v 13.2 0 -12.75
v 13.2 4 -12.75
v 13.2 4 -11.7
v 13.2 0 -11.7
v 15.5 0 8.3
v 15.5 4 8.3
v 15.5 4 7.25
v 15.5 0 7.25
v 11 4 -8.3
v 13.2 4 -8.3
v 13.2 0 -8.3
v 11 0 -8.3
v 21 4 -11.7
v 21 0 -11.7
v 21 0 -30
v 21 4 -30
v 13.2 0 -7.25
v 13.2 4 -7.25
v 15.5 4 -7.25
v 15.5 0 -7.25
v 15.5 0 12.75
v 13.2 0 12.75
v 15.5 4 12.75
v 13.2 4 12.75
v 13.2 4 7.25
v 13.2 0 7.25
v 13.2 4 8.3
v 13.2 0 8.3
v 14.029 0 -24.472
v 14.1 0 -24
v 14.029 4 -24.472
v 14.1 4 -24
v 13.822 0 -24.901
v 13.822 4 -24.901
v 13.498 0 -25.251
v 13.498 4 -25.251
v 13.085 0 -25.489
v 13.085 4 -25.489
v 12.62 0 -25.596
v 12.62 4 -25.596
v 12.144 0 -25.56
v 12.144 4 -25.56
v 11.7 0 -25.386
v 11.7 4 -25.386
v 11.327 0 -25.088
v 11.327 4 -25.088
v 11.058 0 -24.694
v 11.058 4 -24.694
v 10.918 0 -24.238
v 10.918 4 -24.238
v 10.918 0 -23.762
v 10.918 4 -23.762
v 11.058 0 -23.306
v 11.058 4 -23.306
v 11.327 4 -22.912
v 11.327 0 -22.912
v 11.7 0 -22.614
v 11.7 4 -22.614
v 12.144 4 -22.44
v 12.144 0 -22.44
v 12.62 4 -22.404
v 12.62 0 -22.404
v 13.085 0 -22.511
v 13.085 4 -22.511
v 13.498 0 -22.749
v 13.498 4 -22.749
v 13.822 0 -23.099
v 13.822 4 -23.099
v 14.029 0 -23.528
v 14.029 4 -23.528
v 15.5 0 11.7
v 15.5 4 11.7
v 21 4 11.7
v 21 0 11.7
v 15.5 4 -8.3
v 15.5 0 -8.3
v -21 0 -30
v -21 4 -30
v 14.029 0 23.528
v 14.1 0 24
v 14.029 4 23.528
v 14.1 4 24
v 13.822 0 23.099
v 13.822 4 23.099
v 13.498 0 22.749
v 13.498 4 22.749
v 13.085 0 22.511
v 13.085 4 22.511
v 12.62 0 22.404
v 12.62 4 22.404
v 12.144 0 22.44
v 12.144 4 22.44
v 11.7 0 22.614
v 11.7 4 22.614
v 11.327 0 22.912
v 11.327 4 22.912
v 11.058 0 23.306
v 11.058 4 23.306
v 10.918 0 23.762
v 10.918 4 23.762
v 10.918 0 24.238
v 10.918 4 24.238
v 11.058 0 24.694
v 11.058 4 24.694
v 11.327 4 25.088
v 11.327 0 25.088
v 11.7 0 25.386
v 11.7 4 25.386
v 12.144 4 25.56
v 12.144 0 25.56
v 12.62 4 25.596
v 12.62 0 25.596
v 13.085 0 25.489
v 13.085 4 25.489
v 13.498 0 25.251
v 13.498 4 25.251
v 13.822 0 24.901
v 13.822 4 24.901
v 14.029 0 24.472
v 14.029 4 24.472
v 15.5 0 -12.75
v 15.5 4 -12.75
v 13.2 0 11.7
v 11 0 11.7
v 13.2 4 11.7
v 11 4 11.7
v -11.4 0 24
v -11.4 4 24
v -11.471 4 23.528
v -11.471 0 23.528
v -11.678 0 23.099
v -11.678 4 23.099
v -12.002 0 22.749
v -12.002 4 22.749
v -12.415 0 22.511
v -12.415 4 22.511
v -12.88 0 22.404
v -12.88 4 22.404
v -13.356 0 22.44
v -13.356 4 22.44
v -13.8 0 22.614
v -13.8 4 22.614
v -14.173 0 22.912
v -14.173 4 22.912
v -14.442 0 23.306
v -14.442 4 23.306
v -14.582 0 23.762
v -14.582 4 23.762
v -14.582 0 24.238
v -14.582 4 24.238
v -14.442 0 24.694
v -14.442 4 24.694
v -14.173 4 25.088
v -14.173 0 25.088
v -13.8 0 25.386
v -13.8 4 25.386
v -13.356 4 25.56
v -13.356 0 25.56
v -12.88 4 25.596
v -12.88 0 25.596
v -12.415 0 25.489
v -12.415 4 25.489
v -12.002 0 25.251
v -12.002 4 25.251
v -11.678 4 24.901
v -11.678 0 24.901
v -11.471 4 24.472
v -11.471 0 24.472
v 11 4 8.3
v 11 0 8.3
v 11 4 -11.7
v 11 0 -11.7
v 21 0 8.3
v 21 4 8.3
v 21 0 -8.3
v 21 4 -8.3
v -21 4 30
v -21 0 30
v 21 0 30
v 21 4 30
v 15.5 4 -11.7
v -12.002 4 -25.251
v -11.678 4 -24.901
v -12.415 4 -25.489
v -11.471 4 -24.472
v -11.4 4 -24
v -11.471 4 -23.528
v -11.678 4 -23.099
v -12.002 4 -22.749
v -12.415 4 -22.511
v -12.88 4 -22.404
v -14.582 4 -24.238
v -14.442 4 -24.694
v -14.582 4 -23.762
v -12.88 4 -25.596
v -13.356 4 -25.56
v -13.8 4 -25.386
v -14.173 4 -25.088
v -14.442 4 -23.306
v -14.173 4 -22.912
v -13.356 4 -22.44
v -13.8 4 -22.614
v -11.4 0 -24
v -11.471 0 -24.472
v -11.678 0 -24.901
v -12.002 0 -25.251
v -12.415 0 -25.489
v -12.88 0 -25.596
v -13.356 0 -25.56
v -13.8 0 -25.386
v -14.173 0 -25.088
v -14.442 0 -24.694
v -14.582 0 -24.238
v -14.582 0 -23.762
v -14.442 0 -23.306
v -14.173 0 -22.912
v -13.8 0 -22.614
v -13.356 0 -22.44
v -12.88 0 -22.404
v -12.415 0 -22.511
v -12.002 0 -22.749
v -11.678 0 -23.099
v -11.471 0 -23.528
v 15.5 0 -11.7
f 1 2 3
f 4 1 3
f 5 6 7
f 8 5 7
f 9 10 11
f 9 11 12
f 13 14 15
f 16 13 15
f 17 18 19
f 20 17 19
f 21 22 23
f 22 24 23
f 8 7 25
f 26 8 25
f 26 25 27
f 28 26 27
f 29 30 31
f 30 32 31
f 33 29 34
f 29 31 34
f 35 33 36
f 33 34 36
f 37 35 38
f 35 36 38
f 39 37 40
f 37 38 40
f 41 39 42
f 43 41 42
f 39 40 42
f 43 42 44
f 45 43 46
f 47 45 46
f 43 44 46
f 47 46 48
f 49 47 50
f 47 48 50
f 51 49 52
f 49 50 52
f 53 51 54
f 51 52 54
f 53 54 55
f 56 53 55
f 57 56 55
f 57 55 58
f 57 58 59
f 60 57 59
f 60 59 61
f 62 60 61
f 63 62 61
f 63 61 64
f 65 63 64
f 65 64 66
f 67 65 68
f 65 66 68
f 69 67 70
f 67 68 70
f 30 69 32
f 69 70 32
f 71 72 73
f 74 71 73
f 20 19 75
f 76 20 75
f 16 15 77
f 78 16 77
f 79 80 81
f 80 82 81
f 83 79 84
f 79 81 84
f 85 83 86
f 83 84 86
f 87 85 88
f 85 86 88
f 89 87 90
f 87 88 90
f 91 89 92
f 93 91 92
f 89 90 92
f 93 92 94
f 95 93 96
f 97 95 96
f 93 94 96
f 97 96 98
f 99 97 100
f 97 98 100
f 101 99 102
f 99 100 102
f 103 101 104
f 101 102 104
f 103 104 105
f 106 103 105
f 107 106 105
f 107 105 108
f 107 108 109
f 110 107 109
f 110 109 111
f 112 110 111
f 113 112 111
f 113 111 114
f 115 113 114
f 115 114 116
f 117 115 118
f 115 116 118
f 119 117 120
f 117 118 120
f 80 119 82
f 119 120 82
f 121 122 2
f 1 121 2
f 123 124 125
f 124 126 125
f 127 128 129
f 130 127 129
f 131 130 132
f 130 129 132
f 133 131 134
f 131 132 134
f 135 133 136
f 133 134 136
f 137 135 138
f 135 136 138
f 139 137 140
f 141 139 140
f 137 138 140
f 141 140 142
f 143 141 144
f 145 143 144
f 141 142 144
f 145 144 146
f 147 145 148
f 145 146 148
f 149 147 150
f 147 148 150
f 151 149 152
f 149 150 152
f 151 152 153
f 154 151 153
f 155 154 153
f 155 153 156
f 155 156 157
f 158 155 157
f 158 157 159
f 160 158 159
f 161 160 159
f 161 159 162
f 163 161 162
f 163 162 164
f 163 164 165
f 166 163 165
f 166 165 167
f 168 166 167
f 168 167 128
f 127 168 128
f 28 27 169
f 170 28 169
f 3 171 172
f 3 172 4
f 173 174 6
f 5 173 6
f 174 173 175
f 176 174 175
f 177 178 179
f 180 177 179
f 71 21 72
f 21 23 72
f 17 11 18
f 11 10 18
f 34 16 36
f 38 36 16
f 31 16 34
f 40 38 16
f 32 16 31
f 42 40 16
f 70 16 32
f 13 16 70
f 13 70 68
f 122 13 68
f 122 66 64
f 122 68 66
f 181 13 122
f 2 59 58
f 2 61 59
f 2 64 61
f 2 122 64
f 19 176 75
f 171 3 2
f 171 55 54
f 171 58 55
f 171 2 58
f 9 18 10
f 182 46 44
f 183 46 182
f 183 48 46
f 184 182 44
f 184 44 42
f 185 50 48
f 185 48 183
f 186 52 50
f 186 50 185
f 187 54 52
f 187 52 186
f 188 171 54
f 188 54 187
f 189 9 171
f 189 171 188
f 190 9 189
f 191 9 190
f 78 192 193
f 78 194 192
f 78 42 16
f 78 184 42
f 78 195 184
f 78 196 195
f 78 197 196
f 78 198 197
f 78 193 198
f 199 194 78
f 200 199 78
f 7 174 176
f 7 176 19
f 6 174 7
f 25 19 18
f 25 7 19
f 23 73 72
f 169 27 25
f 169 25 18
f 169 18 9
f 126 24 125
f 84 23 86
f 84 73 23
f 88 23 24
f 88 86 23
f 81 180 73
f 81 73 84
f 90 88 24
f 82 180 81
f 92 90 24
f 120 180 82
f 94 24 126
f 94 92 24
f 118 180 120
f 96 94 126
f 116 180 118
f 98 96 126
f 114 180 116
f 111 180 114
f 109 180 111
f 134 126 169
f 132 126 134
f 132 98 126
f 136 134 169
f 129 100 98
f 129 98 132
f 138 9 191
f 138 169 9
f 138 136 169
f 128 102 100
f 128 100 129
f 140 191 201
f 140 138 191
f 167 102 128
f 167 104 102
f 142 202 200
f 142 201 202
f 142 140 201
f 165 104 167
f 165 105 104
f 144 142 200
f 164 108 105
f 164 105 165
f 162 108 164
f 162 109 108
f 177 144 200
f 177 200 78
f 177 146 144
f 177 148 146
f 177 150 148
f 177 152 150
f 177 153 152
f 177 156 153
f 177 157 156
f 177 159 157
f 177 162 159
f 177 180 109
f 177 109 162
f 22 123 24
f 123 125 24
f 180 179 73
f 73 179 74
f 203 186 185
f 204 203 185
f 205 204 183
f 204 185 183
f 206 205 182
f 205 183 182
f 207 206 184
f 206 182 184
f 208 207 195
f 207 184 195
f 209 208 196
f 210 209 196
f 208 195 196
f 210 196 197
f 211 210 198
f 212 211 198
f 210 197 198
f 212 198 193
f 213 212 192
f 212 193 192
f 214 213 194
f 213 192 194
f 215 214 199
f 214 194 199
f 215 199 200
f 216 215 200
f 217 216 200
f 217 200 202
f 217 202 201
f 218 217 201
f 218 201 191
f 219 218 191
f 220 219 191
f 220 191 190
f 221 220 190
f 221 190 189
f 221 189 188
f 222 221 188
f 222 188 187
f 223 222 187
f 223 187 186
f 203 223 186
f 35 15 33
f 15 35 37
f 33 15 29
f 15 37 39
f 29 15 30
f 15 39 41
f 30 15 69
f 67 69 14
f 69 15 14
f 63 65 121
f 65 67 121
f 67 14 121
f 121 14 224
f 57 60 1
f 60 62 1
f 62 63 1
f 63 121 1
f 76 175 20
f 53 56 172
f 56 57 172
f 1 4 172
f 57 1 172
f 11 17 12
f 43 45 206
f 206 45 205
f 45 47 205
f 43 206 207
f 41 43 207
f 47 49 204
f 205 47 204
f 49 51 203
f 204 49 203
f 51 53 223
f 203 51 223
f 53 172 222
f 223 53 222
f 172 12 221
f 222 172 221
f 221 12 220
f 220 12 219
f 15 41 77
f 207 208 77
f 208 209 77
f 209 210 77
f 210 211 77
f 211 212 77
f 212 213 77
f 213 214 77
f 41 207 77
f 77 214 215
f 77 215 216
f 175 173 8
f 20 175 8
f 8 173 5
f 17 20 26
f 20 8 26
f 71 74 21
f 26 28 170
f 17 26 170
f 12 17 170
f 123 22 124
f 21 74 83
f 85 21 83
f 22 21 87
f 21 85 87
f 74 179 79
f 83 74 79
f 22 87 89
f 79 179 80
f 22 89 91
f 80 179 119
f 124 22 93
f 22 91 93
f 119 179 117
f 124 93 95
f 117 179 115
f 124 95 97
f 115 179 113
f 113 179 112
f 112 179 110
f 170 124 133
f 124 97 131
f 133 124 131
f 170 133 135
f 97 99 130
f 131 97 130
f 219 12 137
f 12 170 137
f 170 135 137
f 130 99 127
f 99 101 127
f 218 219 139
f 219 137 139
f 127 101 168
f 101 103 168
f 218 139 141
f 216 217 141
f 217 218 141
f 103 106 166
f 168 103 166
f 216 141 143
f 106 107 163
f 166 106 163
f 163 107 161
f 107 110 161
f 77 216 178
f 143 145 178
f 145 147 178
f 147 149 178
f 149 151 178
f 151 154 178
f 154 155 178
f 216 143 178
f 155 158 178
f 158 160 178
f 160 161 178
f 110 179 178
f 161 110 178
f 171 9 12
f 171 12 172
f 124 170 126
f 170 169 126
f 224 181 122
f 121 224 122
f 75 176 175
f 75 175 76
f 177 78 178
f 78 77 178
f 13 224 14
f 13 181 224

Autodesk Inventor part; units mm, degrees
ref_plane "YZ Plane" through (0, 0, 0) normal (1, 0, 0) x (0, 1, 0)
ref_plane "XZ Plane" through (0, 0, 0) normal (0, 1, 0) x (-1, 0, 0)
ref_plane "XY Plane" through (0, 0, 0) normal (0, 0, 1) x (1, 0, 0)
sketch "Эскиз1" plane through (0, 0, 0) normal (0, 1, 0) x (-1, 0, 0)
  line L0 (21, 30) -> (-21, 30)
  line L1 (-21, 30) -> (-21, -30)
  line L2 (-21, -30) -> (21, -30)
  line L3 (21, -30) -> (21, 30)
  line L4 (21, 30) -> (-21, -30) construction
  line L5 (-21, 30) -> (21, -30) construction
  point P0 (0, 0)
  dimension "d0" = 42
  dimension "d1" = 60
extrude "Выдавливание1" add sketch "Эскиз1" along normal blind 4
sketch "Эскиз4" plane through (0, 4, 0) normal (0, 1, 0) x (1, 0, 0)
  circle A0 centre (-13, -24) radius 1.6
  circle A1 centre (12.5, -24) radius 1.6
  circle A2 centre (12.5, 24) radius 1.6
  circle A3 centre (-13, 24) radius 1.6
  line L0 (-21, 30) -> (-21, -30) projected
  line L1 (-21, -30) -> (21, -30) projected
  line L2 (21, -30) -> (21, 30) projected
  line L3 (21, 30) -> (-21, 30) projected
  point P0 (0, 0)
  dimension "d28" = 3.2
  dimension "d29" = 3.2
  dimension "d31" = 3.2
  dimension "d32" = 8
  dimension "d33" = 6
  dimension "d34" = 6
  dimension "d36" = 6
  dimension "d37" = 6
  dimension "d38" = 8
  dimension "d56" = 25.5
  dimension "d57" = 3.2
  dimension "d58" = 25.5
extrude "Выдавливание3" cut sketch "Эскиз4" against normal blind 10 contours A0 | A1 | A2 | A3
sketch "Эскиз5" plane through (0, 4, 0) normal (0, 1, 0) x (1, 0, 0)
  line L0 (21, -30) -> (21, 30) projected
  line L1 (21, -8.3) -> (11, -8.3)
  line L2 (11, -8.3) -> (11, -11.7)
  line L3 (11, -11.7) -> (21, -11.7)
  line L4 (21, -11.7) -> (21, -8.3)
  line L5 (21, 8.3) -> (11, 8.3)
  line L6 (11, 8.3) -> (11, 11.7)
  line L7 (11, 11.7) -> (21, 11.7)
  line L8 (21, 11.7) -> (21, 8.3)
  line L9 (0, 0) -> (21, 0) construction
  line L10 (15.5, -7.25) -> (13.2, -7.25)
  line L11 (13.2, -7.25) -> (13.2, -12.75)
  line L12 (13.2, -12.75) -> (15.5, -12.75)
  line L13 (15.5, -12.75) -> (15.5, -7.25)
  line L14 (15.5, -7.25) -> (13.2, -12.75) construction
  line L15 (13.2, -7.25) -> (15.5, -12.75) construction
  line L16 (13.2, 7.25) -> (15.5, 7.25)
  line L17 (15.5, 7.25) -> (15.5, 12.75)
  line L18 (15.5, 12.75) -> (13.2, 12.75)
  line L19 (13.2, 12.75) -> (13.2, 7.25)
  line L20 (13.2, 7.25) -> (15.5, 12.75) construction
  line L21 (15.5, 7.25) -> (13.2, 12.75) construction
  point P0 (21, -10)
  point P1 (21, 10)
  point P2 (14.35, -10)
  point P3 (14.35, 10)
  point P4 (15.5, -10)
  point P5 (15.5, -11.7)
  point P6 (21, -11.7)
  point P7 (15.5, -8.3)
  point P8 (13.2, -8.3)
  point P9 (13.2, -11.7)
  point P10 (13.2, 8.3)
  point P11 (15.5, 8.3)
  point P12 (21, 8.3)
  point P13 (21, 11.7)
  point P14 (15.5, 11.7)
  point P15 (13.2, 11.7)
  dimension "d42" = 10
  dimension "d43" = 3.4
  dimension "d44" = 10
  dimension "d45" = 3.4
  dimension "d46" = 10
  dimension "d47" = 10
  dimension "d48" = 2.3
  dimension "d49" = 5.5
  dimension "d50" = 2.3
  dimension "d51" = 5.5
  dimension "d52" = 5.5
  dimension "d53" = 5.5
extrude "Выдавливание4" cut sketch "Эскиз5" against normal blind 4
properties part number "каретки_потолок"
